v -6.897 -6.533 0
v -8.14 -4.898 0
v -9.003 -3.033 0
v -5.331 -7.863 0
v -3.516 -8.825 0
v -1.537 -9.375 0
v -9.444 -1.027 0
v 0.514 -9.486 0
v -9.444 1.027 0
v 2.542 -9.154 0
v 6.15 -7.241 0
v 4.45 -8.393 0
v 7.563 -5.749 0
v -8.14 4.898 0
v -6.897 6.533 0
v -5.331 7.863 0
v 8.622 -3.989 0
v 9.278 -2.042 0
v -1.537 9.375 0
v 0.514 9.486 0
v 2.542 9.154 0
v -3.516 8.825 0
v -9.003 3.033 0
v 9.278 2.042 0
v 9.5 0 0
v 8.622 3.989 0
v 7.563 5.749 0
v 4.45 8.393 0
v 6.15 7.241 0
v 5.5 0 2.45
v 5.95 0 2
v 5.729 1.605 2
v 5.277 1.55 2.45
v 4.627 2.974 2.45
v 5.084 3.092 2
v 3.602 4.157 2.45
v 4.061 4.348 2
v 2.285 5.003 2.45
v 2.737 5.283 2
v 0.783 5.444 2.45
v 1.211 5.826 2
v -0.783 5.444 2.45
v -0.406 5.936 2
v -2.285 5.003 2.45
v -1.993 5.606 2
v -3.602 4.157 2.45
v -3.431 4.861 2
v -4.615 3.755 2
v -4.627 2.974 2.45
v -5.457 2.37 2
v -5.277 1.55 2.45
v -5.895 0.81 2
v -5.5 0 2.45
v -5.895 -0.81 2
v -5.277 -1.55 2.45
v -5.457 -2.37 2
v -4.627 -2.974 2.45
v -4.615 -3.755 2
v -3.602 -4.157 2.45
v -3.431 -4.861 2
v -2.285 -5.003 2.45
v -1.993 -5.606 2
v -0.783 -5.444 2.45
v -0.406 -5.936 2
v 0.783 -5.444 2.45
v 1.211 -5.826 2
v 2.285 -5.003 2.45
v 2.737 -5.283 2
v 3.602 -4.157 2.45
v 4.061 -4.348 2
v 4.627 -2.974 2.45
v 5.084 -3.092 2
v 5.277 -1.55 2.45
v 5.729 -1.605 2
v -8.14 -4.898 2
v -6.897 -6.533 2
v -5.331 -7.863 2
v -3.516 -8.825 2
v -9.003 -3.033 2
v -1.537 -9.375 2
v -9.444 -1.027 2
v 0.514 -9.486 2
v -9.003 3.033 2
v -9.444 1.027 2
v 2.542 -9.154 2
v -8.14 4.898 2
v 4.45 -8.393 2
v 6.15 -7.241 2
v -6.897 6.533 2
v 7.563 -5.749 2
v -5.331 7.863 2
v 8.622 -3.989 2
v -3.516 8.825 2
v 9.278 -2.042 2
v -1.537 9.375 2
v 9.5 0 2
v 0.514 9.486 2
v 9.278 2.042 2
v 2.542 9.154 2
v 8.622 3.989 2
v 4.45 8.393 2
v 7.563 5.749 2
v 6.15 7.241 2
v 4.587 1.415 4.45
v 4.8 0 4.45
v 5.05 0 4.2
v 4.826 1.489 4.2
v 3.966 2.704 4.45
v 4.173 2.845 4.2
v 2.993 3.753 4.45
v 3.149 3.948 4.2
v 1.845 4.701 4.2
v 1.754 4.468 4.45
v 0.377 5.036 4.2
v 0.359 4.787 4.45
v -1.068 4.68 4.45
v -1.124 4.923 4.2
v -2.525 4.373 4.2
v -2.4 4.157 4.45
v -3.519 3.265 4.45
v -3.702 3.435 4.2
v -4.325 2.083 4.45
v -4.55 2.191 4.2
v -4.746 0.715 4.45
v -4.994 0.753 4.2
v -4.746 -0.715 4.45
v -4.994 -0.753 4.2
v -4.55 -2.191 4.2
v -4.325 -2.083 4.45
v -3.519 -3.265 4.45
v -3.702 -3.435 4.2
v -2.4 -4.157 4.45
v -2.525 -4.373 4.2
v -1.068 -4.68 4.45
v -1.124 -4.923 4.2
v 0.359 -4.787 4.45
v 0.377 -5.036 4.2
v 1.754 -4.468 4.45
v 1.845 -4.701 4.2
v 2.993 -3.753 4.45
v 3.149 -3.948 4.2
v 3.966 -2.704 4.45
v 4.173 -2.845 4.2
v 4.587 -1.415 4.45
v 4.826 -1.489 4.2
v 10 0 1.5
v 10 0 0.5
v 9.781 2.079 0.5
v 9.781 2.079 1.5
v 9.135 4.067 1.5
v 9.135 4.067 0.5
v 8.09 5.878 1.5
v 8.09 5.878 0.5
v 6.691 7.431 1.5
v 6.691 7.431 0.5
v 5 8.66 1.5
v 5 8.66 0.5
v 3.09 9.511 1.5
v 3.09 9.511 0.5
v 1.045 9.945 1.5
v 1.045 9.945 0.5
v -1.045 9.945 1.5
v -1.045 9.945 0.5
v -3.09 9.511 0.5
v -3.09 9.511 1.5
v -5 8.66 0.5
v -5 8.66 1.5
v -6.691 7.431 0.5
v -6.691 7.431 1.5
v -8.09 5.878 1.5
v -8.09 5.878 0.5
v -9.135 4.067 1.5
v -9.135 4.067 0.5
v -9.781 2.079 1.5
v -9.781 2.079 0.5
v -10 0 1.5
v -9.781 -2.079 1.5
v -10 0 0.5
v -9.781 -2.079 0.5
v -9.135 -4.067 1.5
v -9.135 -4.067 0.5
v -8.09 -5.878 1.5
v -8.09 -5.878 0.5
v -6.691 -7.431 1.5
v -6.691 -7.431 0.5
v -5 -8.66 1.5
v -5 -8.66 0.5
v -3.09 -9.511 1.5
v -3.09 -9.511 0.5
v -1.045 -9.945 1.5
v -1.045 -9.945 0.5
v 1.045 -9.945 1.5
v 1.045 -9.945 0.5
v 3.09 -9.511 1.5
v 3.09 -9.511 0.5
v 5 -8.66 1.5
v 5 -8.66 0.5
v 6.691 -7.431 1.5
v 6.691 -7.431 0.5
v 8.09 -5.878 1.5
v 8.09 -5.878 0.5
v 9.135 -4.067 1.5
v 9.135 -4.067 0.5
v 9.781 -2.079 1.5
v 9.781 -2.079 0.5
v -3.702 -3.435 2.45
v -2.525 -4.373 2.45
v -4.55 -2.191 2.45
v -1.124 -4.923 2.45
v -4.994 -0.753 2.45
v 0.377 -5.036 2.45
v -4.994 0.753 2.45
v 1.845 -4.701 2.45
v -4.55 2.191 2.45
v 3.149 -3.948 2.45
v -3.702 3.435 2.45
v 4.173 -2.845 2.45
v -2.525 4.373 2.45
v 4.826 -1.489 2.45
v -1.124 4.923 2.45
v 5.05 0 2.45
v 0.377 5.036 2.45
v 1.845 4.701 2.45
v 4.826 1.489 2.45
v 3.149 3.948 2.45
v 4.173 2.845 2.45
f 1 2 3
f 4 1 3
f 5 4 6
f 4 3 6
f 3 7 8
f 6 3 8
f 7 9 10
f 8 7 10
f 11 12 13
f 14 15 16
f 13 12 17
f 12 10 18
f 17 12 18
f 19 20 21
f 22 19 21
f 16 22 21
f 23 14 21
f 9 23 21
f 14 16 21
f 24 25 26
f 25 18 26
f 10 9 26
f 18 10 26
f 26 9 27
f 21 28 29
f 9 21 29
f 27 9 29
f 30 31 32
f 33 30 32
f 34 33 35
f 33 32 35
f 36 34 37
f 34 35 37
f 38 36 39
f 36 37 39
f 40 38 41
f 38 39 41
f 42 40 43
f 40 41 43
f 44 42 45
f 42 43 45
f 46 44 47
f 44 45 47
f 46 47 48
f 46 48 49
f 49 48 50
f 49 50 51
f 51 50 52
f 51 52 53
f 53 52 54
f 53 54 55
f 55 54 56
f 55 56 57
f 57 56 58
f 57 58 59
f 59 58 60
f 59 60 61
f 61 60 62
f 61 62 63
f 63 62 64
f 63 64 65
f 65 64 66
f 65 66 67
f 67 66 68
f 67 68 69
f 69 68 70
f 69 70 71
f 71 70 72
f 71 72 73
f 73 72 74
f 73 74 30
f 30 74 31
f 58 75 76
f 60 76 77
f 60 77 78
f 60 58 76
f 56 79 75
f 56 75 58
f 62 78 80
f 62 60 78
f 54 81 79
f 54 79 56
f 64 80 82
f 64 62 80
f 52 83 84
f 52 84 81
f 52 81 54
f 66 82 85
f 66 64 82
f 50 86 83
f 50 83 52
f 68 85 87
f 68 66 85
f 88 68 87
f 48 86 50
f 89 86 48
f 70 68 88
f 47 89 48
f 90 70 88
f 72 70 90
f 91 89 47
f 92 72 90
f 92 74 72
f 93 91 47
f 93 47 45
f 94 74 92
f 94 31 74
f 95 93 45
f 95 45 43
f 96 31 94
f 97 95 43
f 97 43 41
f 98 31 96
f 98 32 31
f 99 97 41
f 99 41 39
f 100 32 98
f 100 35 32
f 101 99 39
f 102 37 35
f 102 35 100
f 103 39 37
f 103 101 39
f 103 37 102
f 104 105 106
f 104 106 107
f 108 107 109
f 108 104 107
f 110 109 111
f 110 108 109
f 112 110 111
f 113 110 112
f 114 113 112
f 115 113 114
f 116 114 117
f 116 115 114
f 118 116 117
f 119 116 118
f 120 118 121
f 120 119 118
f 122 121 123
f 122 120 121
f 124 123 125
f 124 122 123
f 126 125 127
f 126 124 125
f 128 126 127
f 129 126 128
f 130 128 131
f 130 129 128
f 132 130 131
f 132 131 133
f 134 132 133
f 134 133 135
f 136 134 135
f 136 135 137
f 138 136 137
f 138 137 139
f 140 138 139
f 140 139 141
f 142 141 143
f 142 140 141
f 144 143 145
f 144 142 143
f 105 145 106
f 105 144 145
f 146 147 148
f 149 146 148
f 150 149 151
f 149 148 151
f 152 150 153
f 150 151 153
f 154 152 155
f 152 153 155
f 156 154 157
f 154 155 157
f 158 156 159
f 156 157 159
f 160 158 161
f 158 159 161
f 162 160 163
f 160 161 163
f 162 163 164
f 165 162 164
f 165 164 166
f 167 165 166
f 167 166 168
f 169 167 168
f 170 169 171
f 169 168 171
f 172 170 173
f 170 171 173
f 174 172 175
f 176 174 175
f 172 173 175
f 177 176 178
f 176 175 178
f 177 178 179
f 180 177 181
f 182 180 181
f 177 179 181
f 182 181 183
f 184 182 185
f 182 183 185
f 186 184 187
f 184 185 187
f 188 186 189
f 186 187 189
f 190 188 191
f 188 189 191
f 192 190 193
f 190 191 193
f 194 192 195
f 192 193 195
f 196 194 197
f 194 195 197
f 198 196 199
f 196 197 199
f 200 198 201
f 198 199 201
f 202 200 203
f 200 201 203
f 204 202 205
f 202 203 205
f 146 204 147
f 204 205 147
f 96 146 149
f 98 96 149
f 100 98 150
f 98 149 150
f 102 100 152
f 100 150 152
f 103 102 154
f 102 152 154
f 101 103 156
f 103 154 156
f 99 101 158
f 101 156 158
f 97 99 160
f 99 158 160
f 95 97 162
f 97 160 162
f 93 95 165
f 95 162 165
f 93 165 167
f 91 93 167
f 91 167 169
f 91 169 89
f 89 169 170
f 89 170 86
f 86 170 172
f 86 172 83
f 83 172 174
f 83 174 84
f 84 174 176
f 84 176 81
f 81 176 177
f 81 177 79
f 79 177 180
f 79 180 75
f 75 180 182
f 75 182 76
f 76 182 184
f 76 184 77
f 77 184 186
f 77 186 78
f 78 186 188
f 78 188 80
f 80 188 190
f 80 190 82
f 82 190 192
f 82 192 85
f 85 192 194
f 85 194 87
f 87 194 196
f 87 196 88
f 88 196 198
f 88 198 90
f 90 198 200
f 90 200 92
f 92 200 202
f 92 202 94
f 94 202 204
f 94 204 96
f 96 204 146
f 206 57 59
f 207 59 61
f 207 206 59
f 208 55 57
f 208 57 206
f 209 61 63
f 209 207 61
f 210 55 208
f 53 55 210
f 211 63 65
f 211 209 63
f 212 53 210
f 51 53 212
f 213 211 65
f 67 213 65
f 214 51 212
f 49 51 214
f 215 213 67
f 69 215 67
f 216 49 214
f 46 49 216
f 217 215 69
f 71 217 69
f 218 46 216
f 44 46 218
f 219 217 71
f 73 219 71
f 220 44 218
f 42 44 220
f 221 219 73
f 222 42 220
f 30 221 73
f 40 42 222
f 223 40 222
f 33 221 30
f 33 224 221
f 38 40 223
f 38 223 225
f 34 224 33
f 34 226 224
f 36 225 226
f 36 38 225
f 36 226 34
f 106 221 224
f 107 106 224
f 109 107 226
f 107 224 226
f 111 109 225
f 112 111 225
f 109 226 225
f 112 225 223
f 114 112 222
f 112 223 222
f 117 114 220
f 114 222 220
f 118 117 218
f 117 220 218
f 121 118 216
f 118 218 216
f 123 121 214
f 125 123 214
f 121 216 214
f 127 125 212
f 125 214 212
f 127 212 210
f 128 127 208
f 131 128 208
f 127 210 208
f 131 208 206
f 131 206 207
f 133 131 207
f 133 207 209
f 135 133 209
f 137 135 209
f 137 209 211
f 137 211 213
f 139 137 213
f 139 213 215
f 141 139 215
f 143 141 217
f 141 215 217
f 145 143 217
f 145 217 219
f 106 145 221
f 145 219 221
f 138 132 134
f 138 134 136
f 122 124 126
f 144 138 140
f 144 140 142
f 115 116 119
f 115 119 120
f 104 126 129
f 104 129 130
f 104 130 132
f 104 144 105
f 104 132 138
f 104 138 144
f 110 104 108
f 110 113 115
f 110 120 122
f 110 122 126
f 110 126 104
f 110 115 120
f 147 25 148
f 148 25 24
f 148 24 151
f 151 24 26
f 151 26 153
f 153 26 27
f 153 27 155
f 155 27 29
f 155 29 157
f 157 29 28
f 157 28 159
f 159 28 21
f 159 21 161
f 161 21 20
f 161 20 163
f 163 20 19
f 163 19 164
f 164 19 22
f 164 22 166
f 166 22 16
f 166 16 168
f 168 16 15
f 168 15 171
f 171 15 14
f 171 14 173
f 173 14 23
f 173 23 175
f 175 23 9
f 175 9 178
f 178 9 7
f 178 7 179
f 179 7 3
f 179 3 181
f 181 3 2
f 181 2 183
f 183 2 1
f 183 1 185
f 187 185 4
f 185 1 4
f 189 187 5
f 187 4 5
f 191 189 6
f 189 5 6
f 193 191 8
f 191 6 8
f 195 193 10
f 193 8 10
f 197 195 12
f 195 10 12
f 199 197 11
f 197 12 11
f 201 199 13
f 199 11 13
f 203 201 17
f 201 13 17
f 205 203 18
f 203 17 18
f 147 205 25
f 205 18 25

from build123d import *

# Parameters (mm, degrees)
F0_R     = 10
F1_DEPTH = 2
F2_R     = 6
F3_DEPTH = 0.45
F4_R     = 5.05
F5_DEPTH = 2
F6_SIZE  = 0.25
F8_SIZE  = 0.5


# Not quite as in the source:
# - a fillet or chamfer that OpenCascade refuses, or shapes differently, is made with other operations: its cross-section is extruded or revolved along the edge and cut away or added


with BuildPart() as f1:
    # F0 (on Top) → F1 (new body)
    with BuildSketch(Plane.XY):
        Circle(F0_R)
    extrude(amount=F1_DEPTH)

    # F2 (on face) → F3 (join)
    with BuildSketch(Plane.XY.offset(2)):
        Circle(F2_R)
    extrude(amount=F3_DEPTH)

    # F4 (on face) → F5 (join)
    with BuildSketch(Plane.XY.offset(2.45)):
        Circle(F4_R)
    extrude(amount=F5_DEPTH)

    # F6
    f6_edges = [f1.edges().sort_by_distance(p)[0] for p in [
        (-5.05, 0, 4.45),
    ]]
    chamfer(f6_edges, length=F6_SIZE)

    # F7: chamfer of 0.5 on 1 edges, made by hand


with BuildPart() as f7_tool2:
    # F7_s3 → F7_t4 (revolve)
    with BuildSketch(Plane.XZ):
        Polygon((5.5, 2.45), (6, 1.95), (6, 2.45), align=None)
    revolve(axis=Axis((0, 0, 2.45), (0, 0, 1)))

    split(bisect_by=Plane.XY.offset(2), keep=Keep.TOP)


with BuildPart() as f1_1:
    add(f1.part)

    # F7_t1: cut F7_tool2
    add(f7_tool2.part, mode=Mode.SUBTRACT)

    # F8
    f8_edges = [f1_1.edges().sort_by_distance(p)[0] for p in [
        (-10, 0, 0),
        (-10, 0, 2),
    ]]
    chamfer(f8_edges, length=F8_SIZE)


solid = f1_1.part
